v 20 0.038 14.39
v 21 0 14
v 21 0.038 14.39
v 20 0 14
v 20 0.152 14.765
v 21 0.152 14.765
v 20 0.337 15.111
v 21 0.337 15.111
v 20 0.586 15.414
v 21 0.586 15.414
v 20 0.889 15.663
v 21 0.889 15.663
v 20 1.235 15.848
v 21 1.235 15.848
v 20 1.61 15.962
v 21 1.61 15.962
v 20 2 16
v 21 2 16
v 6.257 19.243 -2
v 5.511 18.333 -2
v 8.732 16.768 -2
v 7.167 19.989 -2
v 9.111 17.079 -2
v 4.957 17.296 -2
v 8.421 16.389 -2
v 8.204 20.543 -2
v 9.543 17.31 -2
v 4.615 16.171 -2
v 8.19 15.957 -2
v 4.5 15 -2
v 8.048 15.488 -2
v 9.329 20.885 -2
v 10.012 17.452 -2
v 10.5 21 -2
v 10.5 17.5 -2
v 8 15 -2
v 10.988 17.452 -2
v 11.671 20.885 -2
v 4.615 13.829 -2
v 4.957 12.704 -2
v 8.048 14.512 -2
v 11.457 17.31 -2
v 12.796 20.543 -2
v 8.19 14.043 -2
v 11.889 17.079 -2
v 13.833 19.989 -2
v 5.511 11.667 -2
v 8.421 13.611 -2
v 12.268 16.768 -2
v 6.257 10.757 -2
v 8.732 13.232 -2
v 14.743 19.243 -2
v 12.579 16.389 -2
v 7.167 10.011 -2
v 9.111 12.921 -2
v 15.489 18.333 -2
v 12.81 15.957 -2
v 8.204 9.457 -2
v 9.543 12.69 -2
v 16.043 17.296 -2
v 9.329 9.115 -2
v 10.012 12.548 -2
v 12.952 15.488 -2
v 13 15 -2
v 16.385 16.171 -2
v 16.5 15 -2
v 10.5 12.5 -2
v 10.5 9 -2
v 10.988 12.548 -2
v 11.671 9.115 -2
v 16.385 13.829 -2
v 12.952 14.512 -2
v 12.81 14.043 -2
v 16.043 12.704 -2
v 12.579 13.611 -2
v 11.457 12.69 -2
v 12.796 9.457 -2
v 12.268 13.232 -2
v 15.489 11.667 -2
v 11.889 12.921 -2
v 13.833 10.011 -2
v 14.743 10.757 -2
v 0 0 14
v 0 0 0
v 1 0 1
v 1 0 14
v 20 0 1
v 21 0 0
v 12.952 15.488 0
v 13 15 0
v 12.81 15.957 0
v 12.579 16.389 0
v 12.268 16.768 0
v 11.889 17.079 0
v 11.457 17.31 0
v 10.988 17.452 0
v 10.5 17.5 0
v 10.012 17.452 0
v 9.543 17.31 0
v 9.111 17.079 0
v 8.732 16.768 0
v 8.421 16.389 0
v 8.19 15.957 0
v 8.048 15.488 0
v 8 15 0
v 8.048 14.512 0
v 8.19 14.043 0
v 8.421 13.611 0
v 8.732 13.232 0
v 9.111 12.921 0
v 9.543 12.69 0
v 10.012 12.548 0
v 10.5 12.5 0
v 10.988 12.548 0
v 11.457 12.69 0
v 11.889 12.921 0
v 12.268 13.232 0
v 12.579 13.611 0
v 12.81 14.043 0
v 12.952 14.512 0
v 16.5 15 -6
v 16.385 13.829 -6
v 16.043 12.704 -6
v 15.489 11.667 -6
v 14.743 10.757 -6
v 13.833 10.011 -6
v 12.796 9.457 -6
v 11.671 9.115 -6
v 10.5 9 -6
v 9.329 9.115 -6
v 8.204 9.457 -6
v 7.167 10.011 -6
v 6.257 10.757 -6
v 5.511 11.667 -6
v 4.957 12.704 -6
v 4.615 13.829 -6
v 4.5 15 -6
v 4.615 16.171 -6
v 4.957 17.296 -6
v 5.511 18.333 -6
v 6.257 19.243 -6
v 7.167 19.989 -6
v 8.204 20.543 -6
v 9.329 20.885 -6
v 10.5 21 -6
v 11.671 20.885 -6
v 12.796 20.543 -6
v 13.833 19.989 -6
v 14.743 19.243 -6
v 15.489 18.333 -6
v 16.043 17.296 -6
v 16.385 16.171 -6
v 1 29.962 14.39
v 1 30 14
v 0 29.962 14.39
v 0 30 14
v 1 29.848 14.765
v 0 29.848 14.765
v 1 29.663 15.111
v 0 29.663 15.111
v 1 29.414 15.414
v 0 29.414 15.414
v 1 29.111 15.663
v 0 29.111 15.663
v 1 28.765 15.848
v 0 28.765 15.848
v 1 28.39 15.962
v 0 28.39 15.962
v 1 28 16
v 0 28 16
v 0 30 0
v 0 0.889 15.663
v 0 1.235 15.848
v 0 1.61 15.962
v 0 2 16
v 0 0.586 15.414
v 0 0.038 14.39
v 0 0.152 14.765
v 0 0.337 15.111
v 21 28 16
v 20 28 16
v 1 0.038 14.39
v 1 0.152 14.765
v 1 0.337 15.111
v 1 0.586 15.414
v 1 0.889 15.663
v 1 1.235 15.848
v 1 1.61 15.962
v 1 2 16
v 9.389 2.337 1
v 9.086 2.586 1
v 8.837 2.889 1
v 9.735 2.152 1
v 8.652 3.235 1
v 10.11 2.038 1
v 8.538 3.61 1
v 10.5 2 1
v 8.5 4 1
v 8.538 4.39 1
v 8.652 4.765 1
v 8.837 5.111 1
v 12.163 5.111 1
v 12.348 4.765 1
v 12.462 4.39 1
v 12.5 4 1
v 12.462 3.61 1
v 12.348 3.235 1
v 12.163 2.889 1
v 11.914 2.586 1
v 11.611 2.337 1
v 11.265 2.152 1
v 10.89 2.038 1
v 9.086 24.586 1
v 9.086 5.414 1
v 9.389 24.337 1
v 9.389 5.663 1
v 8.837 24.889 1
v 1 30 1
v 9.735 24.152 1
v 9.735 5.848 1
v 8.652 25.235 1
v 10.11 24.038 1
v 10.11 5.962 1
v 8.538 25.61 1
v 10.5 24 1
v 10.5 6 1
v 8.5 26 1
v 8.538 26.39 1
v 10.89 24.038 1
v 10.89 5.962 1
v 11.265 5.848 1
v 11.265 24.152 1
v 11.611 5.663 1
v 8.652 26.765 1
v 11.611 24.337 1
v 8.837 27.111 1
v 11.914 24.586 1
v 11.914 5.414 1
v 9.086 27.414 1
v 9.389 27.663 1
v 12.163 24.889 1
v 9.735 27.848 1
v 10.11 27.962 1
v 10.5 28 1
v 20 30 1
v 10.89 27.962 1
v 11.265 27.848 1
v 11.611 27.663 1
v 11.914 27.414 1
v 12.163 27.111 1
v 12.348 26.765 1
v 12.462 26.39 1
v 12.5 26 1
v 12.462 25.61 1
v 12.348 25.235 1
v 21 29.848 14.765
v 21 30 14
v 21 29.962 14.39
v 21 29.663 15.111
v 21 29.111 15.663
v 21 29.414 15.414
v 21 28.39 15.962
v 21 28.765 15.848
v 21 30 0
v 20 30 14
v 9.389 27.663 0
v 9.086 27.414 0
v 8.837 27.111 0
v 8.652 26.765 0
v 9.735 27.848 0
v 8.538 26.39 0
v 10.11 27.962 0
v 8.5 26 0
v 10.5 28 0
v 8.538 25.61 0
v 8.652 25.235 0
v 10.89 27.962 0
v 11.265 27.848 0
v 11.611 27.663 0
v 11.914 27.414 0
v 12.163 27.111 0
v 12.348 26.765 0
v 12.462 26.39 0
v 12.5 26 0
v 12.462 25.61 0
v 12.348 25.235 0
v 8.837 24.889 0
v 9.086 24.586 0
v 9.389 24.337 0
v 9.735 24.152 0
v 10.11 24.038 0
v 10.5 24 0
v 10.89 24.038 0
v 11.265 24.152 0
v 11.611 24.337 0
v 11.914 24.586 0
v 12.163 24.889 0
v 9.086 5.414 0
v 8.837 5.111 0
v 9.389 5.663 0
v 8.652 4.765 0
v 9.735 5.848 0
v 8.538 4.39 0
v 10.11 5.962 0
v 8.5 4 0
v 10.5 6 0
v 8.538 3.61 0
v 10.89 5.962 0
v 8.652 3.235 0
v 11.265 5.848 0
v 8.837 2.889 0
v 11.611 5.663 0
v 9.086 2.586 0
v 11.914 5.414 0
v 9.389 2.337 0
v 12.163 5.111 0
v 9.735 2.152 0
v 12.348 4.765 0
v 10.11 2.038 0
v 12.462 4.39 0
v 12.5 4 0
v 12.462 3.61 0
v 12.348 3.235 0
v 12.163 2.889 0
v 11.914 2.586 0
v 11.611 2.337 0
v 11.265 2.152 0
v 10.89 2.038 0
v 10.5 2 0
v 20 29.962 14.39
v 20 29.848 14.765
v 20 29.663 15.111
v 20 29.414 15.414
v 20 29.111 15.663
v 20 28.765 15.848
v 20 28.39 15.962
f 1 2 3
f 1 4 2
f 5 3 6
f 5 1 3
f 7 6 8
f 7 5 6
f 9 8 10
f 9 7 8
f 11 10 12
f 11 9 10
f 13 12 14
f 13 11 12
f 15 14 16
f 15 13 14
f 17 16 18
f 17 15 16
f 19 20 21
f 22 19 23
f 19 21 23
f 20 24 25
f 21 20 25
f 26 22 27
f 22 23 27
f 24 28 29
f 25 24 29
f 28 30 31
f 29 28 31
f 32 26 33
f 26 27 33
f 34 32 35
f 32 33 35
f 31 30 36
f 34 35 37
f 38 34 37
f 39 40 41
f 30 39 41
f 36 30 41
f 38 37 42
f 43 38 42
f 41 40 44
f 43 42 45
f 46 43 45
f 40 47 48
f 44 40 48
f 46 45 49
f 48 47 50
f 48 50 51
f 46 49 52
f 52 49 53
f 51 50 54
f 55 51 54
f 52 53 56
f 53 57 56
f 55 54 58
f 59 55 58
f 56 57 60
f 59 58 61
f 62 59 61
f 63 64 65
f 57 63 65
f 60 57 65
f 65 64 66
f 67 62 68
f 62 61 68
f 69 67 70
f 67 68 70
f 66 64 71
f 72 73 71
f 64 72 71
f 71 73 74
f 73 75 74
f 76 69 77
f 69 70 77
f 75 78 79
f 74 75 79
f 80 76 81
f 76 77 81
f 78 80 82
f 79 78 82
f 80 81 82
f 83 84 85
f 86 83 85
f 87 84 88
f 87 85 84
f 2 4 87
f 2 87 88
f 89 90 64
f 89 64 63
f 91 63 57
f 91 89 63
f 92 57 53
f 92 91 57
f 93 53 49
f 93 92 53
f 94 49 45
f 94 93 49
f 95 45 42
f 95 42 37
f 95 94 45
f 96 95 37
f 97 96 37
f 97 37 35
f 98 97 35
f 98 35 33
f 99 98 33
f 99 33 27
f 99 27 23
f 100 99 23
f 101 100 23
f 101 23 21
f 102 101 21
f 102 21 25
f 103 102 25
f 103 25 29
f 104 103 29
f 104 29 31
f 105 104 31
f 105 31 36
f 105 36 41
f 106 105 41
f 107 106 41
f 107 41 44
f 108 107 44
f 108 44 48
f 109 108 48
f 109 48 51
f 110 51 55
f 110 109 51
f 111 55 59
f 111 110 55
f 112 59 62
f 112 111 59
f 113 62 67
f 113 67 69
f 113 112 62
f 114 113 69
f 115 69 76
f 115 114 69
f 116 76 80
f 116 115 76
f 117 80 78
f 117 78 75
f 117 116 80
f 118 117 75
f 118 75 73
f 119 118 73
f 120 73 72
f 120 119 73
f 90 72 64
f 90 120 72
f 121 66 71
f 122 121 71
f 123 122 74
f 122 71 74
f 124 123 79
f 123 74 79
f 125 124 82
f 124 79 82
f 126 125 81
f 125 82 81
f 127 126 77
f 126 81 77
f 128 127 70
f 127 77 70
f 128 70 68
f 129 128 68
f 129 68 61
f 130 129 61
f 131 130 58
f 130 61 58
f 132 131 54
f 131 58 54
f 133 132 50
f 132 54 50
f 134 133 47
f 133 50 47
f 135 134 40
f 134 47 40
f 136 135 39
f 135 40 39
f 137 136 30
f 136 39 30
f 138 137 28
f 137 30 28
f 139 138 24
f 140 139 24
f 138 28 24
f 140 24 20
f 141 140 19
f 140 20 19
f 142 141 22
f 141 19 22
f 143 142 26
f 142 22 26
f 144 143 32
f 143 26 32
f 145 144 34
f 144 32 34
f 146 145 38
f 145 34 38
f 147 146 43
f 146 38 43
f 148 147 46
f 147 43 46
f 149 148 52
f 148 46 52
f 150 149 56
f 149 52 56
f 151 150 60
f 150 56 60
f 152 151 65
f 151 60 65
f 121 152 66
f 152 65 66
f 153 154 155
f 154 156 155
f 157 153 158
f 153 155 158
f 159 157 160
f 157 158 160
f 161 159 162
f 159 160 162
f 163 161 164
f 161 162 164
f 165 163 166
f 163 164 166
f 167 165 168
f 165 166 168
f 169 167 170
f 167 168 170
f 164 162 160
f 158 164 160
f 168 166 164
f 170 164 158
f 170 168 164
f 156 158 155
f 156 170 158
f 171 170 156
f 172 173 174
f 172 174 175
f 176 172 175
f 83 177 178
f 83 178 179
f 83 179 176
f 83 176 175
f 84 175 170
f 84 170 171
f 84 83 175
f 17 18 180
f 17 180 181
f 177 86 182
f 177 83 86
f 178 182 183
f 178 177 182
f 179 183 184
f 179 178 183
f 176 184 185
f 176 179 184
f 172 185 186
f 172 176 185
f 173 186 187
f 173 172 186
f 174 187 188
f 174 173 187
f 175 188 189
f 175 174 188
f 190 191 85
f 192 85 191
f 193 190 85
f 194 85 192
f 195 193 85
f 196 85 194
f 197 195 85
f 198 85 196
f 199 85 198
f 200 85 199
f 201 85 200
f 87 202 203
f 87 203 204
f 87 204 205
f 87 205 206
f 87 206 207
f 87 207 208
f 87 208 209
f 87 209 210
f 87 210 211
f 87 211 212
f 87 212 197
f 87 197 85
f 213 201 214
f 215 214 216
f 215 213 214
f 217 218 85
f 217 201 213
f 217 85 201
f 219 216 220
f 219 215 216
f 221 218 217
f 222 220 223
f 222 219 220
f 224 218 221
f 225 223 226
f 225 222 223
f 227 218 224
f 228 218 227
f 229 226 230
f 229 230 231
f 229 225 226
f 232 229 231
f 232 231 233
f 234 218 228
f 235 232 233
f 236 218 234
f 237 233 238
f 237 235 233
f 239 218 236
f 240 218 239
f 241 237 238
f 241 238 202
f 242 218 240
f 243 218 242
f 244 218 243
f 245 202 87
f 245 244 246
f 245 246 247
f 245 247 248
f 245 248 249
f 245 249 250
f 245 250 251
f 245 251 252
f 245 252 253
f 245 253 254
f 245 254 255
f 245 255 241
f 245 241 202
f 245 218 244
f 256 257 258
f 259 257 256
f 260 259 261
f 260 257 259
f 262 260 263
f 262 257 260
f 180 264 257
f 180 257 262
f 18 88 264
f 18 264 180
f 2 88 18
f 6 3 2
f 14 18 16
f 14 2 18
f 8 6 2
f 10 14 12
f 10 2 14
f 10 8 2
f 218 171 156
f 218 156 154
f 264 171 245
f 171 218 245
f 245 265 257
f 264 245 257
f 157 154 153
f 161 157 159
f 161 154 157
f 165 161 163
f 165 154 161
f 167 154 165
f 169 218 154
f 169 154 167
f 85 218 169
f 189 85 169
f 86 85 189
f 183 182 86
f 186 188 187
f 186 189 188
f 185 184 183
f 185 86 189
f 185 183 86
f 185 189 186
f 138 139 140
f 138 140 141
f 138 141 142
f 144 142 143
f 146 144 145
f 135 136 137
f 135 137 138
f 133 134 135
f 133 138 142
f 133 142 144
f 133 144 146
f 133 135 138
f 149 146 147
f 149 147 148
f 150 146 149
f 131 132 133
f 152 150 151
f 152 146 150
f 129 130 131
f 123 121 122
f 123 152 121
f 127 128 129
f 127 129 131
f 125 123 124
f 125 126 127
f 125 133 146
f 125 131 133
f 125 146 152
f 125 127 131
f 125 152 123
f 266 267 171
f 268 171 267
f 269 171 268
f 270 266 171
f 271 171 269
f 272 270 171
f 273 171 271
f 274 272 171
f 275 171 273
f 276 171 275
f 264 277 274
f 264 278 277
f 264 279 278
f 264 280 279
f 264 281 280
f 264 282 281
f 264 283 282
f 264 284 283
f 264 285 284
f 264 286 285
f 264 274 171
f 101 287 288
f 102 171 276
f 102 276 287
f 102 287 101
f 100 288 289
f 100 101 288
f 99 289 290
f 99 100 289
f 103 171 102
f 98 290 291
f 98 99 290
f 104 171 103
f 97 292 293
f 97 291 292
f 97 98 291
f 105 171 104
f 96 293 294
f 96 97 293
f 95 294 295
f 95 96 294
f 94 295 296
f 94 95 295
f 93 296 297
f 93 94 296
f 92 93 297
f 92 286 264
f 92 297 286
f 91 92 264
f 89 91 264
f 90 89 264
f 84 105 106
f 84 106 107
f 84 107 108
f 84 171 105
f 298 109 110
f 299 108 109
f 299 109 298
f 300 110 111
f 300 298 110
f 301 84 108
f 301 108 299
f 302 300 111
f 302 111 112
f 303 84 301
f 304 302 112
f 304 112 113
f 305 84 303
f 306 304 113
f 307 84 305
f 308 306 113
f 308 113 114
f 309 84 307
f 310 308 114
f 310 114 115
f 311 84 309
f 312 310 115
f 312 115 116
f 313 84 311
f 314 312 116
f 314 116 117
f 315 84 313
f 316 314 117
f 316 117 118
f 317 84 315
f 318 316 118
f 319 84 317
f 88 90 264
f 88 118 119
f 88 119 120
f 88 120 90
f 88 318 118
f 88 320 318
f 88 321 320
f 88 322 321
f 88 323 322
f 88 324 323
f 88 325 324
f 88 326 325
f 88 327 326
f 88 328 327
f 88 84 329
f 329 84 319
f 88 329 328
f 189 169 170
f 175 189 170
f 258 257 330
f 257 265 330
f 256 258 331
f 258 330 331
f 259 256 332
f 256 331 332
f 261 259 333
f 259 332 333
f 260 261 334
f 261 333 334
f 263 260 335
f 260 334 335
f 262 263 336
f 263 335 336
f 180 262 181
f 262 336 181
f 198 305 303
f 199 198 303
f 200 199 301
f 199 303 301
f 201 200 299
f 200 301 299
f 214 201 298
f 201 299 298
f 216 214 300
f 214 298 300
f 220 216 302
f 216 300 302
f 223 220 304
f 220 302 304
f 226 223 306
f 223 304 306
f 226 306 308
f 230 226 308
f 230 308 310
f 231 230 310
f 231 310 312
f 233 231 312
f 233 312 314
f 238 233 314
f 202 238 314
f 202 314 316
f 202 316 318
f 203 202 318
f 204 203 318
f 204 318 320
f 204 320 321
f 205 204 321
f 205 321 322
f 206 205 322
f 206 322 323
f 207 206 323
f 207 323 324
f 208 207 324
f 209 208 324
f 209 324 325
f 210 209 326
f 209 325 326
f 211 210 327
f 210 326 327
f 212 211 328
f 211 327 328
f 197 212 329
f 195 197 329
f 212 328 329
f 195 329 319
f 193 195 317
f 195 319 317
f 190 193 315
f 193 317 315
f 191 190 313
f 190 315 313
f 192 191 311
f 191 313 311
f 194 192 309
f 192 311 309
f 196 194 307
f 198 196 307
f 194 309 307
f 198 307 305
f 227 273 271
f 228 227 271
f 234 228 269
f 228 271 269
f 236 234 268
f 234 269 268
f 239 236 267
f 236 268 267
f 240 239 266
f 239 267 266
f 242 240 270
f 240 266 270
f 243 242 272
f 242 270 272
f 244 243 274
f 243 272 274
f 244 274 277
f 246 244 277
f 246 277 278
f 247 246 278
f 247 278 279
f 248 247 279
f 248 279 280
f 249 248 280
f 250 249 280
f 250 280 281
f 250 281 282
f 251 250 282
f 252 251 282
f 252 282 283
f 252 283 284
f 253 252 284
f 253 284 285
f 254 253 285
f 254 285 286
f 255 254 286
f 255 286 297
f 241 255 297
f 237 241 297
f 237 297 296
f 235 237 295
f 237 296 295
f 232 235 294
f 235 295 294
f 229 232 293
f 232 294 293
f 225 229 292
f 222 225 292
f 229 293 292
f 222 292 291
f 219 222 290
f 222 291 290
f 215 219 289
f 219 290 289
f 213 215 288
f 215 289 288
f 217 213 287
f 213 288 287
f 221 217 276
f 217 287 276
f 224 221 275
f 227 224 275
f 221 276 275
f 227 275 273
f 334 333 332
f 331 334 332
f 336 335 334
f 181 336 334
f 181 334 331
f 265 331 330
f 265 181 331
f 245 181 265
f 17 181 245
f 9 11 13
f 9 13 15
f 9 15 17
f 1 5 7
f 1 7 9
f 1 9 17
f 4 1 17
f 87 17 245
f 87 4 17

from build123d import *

# Parameters (mm, degrees)
F1_DEPTH = 30
F2_R     = 2.5
F3_DEPTH = 3
F4_R     = 6
F4_R_2   = 2.5
F5_DEPTH = 4
F6_R     = 2
F7_D     = 4
F7_DEPTH = 15
F7_TIP   = 1.2017212381


with BuildPart() as f1:
    # F0 (on Front) → F1 (new body)
    with BuildSketch(Plane.XZ):
        Polygon((0, 1), (0, 0), (21, 0), (21, 1), (21, 16), (20, 16), (20, 1), (1, 1), (1, 16), (0, 16), align=None)
    extrude(amount=-F1_DEPTH)

    # F2 (on face) → F3 (join)
    with BuildSketch(Plane.XY.offset(1)):
        with Locations((10.5, 15)):
            Circle(F2_R)
    extrude(amount=-F3_DEPTH)

    # F4 (on face) → F5 (join)
    with BuildSketch(Plane(origin=(0, 0, -2), x_dir=(1, 0, 0), z_dir=(0, 0, -1))):
        with Locations((10.5, -15)):
            Circle(F4_R)
        with Locations((10.5, -15)):
            Circle(F4_R_2, mode=Mode.SUBTRACT)
        with Locations((10.5, -15)):
            Circle(F4_R_2)
    extrude(amount=F5_DEPTH)

    # F6
    f6_edges = [f1.edges().sort_by_distance(p)[0] for p in [
        (20.5, 0, 16),
        (20.5, 30, 16),
        (0.5, 30, 16),
        (0.5, 0, 16),
    ]]
    fillet(f6_edges, radius=F6_R)

    # F7
    with Locations(Plane.XY.offset(1)):
        with Locations((10.5, 4), (10.5, 26)):
            Hole(F7_D / 2, depth=F7_DEPTH)
            with Locations((0, 0, -(F7_DEPTH + F7_TIP / 2))):  # 118° drill point
                Cone(0, F7_D / 2, F7_TIP, mode=Mode.SUBTRACT)


solid = f1.part
